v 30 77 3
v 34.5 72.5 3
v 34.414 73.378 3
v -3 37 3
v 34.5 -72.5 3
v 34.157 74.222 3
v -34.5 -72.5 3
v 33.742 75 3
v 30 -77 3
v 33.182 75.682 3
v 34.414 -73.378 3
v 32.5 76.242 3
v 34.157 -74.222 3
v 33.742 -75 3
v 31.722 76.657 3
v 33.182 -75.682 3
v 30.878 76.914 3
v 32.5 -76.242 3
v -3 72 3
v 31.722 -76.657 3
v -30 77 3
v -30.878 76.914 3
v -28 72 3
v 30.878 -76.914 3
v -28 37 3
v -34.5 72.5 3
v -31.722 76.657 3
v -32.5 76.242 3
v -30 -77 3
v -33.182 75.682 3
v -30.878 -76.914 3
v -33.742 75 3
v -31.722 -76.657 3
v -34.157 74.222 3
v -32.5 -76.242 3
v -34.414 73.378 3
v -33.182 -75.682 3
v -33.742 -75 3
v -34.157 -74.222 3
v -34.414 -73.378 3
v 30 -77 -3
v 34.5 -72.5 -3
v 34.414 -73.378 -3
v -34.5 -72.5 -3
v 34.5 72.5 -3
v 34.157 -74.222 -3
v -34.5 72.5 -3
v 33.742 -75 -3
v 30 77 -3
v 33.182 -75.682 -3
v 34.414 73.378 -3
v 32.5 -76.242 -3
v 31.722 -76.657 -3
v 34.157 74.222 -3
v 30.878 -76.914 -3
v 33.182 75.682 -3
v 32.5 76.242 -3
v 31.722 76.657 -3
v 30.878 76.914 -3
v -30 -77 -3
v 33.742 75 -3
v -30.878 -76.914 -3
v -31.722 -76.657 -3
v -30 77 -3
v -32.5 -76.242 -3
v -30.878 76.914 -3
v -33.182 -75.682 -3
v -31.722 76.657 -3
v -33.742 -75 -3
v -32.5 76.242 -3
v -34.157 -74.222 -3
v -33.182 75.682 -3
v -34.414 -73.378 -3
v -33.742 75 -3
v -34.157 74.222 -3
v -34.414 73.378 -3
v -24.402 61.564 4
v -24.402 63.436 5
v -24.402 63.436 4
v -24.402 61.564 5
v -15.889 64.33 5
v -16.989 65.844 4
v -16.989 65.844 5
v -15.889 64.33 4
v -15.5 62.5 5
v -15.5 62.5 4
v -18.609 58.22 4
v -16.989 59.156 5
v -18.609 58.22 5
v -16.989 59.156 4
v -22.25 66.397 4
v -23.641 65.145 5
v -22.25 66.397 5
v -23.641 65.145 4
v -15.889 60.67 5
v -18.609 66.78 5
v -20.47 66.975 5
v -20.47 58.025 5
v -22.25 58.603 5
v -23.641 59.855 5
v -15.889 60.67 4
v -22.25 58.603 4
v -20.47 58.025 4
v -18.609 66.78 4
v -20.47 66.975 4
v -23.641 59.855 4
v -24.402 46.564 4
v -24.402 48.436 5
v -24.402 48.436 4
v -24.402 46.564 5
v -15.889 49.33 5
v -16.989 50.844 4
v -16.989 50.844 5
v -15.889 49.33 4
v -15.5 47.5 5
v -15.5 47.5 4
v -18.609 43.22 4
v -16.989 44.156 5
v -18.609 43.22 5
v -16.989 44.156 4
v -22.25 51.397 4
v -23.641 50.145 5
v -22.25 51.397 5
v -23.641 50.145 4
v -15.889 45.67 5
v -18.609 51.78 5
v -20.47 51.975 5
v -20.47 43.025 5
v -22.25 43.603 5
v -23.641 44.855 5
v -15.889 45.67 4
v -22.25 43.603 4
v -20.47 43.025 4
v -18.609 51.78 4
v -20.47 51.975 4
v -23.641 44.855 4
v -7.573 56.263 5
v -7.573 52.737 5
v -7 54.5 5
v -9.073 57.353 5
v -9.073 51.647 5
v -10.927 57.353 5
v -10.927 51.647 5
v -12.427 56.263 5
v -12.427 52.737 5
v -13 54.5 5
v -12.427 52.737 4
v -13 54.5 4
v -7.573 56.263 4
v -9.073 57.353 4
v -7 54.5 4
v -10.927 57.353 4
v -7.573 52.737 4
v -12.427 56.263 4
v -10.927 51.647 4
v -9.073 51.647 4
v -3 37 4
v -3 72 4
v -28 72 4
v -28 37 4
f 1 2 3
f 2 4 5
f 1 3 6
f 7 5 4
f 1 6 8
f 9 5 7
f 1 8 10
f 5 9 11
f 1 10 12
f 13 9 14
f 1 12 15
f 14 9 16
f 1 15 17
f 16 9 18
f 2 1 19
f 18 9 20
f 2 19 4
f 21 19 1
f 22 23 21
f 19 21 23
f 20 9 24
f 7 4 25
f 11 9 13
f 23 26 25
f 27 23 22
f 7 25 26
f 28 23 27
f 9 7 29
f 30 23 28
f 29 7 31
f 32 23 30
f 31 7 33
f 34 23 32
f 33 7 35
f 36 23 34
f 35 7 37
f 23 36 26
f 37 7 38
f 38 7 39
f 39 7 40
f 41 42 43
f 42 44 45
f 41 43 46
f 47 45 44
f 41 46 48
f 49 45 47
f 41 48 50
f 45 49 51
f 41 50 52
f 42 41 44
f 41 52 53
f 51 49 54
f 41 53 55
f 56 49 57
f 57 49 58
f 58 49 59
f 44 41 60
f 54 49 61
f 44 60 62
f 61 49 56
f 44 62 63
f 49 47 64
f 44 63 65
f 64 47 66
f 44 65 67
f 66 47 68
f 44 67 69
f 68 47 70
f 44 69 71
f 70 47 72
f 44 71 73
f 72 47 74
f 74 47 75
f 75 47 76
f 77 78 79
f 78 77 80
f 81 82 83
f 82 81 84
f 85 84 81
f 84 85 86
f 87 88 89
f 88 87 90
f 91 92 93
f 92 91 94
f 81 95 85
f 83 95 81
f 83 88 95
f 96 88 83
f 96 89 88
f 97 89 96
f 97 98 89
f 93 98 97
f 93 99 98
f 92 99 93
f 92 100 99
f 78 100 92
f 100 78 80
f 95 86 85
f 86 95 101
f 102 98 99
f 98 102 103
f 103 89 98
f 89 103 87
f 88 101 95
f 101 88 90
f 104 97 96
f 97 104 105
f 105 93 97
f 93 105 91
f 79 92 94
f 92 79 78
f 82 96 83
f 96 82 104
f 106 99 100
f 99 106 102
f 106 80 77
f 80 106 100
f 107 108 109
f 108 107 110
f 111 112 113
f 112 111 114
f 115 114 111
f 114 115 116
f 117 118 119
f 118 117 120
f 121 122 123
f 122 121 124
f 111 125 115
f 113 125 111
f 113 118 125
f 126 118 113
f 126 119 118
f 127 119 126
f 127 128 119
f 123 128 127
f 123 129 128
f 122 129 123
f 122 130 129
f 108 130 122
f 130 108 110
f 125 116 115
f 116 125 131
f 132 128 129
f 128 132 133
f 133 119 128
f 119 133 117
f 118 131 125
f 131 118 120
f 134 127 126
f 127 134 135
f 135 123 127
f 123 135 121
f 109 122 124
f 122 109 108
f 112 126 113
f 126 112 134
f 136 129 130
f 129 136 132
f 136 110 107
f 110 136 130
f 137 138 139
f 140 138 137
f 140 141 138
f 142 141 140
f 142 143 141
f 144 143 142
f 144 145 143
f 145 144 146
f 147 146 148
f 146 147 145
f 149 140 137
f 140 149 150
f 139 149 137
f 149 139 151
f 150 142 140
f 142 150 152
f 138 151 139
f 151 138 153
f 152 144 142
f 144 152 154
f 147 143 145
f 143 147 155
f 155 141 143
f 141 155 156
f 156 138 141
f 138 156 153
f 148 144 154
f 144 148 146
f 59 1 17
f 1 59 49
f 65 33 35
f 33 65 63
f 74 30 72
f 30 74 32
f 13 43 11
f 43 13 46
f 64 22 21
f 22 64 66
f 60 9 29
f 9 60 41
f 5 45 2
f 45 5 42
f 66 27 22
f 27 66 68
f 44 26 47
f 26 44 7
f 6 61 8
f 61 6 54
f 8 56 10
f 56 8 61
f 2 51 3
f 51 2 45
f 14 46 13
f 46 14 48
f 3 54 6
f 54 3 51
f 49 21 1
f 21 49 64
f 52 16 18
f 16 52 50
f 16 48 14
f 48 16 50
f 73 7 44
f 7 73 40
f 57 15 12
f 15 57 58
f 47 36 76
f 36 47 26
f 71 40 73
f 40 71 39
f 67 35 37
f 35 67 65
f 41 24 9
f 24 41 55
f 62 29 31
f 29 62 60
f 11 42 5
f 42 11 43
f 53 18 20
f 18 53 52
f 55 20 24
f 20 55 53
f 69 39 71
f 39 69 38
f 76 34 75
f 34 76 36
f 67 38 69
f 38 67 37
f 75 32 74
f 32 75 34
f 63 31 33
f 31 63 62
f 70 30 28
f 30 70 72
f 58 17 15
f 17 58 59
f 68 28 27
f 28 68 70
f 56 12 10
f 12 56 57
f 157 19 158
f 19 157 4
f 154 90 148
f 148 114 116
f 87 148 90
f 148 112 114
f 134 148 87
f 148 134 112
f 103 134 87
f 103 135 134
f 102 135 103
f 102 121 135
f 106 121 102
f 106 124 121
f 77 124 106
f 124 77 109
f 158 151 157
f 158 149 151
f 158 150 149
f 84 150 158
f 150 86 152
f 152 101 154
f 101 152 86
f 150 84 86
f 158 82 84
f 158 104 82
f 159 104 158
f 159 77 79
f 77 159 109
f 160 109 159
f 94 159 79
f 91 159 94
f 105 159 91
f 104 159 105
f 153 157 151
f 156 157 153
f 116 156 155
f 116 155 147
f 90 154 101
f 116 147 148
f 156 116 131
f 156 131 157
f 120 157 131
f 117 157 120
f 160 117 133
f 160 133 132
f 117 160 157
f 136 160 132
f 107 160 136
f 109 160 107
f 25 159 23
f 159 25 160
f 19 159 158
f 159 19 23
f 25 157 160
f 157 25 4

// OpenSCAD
echo("Работа Павла Юнкер");
len_phone = 145;
width_phone = 60;
thickness_phone = 6;

corner_round = 9;

cube([width_phone, len_phone, thickness_phone], center=true);

color("blue")
translate([width_phone/2-50, len_phone/2-10, 0])
cylinder(d=9, h = thickness_phone - 1);

color("blue")
translate([width_phone/2-50, len_phone/2-25, 0])
cylinder(d=9, h = thickness_phone - 1);

color("blue")
translate([width_phone/2-40, len_phone/2-18, 0])
cylinder(d=6, h = thickness_phone - 1);

module smartphone() {
    hull() {
        color("red")
        translate([width_phone/2, len_phone/2, 0])
        cylinder(h=thickness_phone, d=corner_round, $fn=32, center=true);

        mirror([1,0,0])
        color("red")
        translate([width_phone/2, len_phone/2, 0])
        cylinder(h=thickness_phone, d=corner_round, $fn=32, center=true);

        mirror([0,1,0])
        color("red")
        translate([width_phone/2, len_phone/2, 0])
        cylinder(h=thickness_phone, d=corner_round, $fn=32, center=true);

        mirror([1,0,0])
        mirror([0,1,0])
        color("red")
        translate([width_phone/2, len_phone/2, 0])
        cylinder(h=thickness_phone, d=corner_round, $fn=32, center=true);
    }
}


h = 3;

smartphone();
color("red")
translate([-28, 37, 2])
cube([25, 35, 2]);
